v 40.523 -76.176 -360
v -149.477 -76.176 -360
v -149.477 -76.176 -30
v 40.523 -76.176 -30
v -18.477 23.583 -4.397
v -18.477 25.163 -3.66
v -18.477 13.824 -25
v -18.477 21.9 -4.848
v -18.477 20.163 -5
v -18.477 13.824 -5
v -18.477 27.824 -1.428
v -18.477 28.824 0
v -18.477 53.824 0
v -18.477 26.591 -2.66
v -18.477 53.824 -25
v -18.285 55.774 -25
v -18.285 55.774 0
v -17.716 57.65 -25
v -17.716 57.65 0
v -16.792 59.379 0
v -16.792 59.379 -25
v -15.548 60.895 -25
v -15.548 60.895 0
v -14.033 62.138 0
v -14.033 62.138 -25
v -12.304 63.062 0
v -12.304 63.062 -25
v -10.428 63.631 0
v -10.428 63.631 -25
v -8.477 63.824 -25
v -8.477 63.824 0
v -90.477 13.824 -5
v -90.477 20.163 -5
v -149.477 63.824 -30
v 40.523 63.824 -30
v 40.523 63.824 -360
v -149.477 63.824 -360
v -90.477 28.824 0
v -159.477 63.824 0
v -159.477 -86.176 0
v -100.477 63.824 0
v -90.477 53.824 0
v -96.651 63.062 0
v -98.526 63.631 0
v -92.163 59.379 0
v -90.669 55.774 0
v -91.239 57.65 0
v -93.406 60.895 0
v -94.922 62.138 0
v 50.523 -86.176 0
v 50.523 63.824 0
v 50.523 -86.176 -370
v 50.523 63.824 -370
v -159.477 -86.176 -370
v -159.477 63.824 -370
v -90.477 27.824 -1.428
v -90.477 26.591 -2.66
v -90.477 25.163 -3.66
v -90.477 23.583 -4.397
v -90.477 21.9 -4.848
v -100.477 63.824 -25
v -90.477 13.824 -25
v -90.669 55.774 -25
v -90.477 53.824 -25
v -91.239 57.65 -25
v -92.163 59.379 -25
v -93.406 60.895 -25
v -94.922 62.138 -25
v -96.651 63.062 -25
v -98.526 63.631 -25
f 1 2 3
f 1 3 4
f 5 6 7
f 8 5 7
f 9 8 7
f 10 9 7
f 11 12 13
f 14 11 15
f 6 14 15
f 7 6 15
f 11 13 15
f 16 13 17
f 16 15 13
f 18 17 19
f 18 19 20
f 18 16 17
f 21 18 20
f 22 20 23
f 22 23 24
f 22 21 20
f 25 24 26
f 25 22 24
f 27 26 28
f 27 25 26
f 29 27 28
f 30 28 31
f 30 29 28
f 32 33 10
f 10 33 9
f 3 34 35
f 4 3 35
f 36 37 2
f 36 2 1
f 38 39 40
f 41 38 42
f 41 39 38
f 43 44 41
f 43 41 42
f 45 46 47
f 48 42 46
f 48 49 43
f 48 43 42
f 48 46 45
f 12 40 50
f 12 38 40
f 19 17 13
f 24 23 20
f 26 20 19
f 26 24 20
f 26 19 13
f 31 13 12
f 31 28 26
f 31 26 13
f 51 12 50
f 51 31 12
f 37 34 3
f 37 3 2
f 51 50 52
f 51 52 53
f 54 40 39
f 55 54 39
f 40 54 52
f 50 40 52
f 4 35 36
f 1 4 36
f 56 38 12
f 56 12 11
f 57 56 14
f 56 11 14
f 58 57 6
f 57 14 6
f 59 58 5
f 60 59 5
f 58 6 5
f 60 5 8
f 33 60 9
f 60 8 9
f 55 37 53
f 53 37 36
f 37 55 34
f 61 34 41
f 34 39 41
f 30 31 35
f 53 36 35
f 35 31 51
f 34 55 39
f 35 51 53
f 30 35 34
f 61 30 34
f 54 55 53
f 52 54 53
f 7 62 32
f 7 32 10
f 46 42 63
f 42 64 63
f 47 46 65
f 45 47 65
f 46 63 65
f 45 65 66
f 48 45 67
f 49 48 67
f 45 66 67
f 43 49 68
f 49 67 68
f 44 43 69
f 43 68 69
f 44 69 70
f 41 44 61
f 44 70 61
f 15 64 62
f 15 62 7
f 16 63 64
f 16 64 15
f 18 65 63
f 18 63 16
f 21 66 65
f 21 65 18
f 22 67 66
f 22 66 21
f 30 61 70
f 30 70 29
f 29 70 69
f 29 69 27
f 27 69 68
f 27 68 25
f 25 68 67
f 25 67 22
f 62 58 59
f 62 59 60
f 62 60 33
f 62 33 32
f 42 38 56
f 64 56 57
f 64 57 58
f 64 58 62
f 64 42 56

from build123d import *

# Parameters (mm, degrees)
ESQUISSE1_W             = 210
ESQUISSE1_H             = 150
BOSS_EXTRU_1_DEPTH      = 370
ESQUISSE2_W             = 190
ESQUISSE2_H             = 330
ENL_V_MAT_EXTRU_1_DEPTH = 140
ESQUISSE6_W             = 72
ESQUISSE6_H             = 25
ENL_V_MAT_EXTRU_4_DEPTH = 35
ESQUISSE7_W             = 72
ESQUISSE7_H             = 20
ENL_V_MAT_EXTRU_5_DEPTH = 15
CONG_3_R                = 10
CONG_4_R                = 10
CONG_5_R                = 10


with BuildPart() as part:
    # Esquisse1 → Boss.-Extru.1 (new body)
    with BuildSketch(Plane.XY):
        with Locations((-54.477344992, -11.176470588)):
            Rectangle(ESQUISSE1_W, ESQUISSE1_H)
    extrude(amount=-BOSS_EXTRU_1_DEPTH)

    # Esquisse2 → Enlèv. mat.-Extru.1 (cut)
    with BuildSketch(Plane(origin=(0, 63.823529412, 0), x_dir=(1, 0, 0), z_dir=(0, 1, 0))):
        with Locations((-54.477344992, 195)):
            Rectangle(ESQUISSE2_W, ESQUISSE2_H)
    extrude(amount=-ENL_V_MAT_EXTRU_1_DEPTH, mode=Mode.SUBTRACT)

    # Esquisse6 → Enlèv. mat.-Extru.4 (cut)
    with BuildSketch(Plane(origin=(0, 63.823529412, 0), x_dir=(1, 0, 0), z_dir=(0, 1, 0))):
        with Locations((-54.477344992, 12.5)):
            Rectangle(ESQUISSE6_W, ESQUISSE6_H)
    extrude(amount=-ENL_V_MAT_EXTRU_4_DEPTH, mode=Mode.SUBTRACT)

    # Esquisse7 → Enlèv. mat.-Extru.5 (cut)
    with BuildSketch(Plane(origin=(0, 28.823529412, 0), x_dir=(1, 0, 0), z_dir=(0, 1, 0))):
        with Locations((-54.477344992, 15)):
            Rectangle(ESQUISSE7_W, ESQUISSE7_H)
    extrude(amount=-ENL_V_MAT_EXTRU_5_DEPTH, mode=Mode.SUBTRACT)

    # Congé3
    cong_3_edges = [part.edges().sort_by_distance(p)[0] for p in [
        (-90.477344992, 63.823529412, -12.5),
    ]]
    fillet(cong_3_edges, radius=CONG_3_R)

    # Congé4
    cong_4_edges = [part.edges().sort_by_distance(p)[0] for p in [
        (-18.477344992, 63.823529412, -12.5),
    ]]
    fillet(cong_4_edges, radius=CONG_4_R)

    # Congé5
    # the kernel refuses this fillet: 10 mm, written as the material it takes off along each edge
    with BuildSketch(Plane(origin=(-18.477344992, 28.823529412, -5), x_dir=(0, 0, 1), z_dir=(-1, 0, 0))) as cong_5_piece_1:
        with BuildLine():
            CenterArc((10, -8.660254038), CONG_5_R, 120, 60)
            Line((0, -8.660254038), (-0.2, -8.660254038))
            Line((-0.2, -8.660254038), (-0.2, 0))
            Line((-0.2, 0), (0, 0.2))
            ThreePointArc((0, 0.2), (2.5, 0.2), (4.9, 0.173205081))
            Line((4.9, 0.173205081), (5, 0))
        make_face()
    extrude(amount=72, mode=Mode.SUBTRACT)


solid = part.part
